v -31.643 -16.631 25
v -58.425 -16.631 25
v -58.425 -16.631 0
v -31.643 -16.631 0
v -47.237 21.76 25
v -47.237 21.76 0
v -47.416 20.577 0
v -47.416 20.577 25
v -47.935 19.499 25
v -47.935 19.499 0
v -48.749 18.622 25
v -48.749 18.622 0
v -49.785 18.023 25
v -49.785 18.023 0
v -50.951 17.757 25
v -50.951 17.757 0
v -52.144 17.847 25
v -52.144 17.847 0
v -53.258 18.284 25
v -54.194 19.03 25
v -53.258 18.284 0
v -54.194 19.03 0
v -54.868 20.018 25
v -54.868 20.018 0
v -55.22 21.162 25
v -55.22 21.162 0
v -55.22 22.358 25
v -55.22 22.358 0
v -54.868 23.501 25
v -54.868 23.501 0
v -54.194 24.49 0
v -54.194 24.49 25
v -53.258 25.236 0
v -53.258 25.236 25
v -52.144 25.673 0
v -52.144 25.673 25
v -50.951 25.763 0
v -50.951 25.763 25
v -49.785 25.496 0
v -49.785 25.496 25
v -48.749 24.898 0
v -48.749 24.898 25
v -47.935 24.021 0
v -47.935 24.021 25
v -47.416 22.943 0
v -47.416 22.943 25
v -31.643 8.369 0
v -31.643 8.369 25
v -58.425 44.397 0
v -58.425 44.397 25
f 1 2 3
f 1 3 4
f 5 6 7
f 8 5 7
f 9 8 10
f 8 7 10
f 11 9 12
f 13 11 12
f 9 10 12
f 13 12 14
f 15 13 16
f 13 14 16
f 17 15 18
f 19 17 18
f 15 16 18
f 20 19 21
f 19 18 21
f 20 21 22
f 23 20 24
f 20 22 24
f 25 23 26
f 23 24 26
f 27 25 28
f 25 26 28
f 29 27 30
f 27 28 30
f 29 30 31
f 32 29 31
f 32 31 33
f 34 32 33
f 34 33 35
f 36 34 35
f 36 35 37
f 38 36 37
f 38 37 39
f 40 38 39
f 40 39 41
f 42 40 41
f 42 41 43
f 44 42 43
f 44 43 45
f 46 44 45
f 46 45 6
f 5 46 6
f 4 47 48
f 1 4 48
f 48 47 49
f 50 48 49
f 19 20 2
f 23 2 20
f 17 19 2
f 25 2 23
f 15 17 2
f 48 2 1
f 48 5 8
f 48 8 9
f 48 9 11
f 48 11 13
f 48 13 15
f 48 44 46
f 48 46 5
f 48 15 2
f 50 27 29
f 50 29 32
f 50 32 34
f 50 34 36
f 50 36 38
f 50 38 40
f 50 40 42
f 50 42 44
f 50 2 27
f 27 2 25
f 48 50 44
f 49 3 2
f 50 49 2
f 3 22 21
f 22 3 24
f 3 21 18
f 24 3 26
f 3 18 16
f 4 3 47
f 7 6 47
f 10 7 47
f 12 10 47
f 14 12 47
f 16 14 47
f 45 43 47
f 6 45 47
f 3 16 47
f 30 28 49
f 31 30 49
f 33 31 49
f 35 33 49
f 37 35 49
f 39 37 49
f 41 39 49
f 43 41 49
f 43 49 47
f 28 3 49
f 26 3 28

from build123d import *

# Parameters (mm, degrees)
F1_DEPTH  = 25
F1_FACE_W = 26.781376
F1_FACE_H = 25
F2_DEPTH  = 25
F3_R      = 4.013917
F4_DEPTH  = 25.001


with BuildPart() as f1:
    # F0 (on Top) → F1 (new body)
    with BuildSketch(Plane.XY):
        Polygon((-31.643473, 8.36918), (-58.424849, 44.396508), (-58.424849, 8.36918), align=None)
    extrude(amount=F1_DEPTH)

    # F1_face (on face) → F2 (join)
    with BuildSketch(Plane(origin=(-45.034161, 8.36918, 12.5), x_dir=(1, 0, 0), z_dir=(0, -1, 0))):
        Rectangle(F1_FACE_W, F1_FACE_H)
    extrude(amount=F2_DEPTH)

    # F3 (on face) → F4 (cut, through all)
    with BuildSketch(Plane(origin=(0, 0, 0), x_dir=(1, 0, 0), z_dir=(0, 0, -1))):
        with Locations((-51.251266, -21.759868)):
            Circle(F3_R)
    extrude(amount=-F4_DEPTH, mode=Mode.SUBTRACT)


solid = f1.part
